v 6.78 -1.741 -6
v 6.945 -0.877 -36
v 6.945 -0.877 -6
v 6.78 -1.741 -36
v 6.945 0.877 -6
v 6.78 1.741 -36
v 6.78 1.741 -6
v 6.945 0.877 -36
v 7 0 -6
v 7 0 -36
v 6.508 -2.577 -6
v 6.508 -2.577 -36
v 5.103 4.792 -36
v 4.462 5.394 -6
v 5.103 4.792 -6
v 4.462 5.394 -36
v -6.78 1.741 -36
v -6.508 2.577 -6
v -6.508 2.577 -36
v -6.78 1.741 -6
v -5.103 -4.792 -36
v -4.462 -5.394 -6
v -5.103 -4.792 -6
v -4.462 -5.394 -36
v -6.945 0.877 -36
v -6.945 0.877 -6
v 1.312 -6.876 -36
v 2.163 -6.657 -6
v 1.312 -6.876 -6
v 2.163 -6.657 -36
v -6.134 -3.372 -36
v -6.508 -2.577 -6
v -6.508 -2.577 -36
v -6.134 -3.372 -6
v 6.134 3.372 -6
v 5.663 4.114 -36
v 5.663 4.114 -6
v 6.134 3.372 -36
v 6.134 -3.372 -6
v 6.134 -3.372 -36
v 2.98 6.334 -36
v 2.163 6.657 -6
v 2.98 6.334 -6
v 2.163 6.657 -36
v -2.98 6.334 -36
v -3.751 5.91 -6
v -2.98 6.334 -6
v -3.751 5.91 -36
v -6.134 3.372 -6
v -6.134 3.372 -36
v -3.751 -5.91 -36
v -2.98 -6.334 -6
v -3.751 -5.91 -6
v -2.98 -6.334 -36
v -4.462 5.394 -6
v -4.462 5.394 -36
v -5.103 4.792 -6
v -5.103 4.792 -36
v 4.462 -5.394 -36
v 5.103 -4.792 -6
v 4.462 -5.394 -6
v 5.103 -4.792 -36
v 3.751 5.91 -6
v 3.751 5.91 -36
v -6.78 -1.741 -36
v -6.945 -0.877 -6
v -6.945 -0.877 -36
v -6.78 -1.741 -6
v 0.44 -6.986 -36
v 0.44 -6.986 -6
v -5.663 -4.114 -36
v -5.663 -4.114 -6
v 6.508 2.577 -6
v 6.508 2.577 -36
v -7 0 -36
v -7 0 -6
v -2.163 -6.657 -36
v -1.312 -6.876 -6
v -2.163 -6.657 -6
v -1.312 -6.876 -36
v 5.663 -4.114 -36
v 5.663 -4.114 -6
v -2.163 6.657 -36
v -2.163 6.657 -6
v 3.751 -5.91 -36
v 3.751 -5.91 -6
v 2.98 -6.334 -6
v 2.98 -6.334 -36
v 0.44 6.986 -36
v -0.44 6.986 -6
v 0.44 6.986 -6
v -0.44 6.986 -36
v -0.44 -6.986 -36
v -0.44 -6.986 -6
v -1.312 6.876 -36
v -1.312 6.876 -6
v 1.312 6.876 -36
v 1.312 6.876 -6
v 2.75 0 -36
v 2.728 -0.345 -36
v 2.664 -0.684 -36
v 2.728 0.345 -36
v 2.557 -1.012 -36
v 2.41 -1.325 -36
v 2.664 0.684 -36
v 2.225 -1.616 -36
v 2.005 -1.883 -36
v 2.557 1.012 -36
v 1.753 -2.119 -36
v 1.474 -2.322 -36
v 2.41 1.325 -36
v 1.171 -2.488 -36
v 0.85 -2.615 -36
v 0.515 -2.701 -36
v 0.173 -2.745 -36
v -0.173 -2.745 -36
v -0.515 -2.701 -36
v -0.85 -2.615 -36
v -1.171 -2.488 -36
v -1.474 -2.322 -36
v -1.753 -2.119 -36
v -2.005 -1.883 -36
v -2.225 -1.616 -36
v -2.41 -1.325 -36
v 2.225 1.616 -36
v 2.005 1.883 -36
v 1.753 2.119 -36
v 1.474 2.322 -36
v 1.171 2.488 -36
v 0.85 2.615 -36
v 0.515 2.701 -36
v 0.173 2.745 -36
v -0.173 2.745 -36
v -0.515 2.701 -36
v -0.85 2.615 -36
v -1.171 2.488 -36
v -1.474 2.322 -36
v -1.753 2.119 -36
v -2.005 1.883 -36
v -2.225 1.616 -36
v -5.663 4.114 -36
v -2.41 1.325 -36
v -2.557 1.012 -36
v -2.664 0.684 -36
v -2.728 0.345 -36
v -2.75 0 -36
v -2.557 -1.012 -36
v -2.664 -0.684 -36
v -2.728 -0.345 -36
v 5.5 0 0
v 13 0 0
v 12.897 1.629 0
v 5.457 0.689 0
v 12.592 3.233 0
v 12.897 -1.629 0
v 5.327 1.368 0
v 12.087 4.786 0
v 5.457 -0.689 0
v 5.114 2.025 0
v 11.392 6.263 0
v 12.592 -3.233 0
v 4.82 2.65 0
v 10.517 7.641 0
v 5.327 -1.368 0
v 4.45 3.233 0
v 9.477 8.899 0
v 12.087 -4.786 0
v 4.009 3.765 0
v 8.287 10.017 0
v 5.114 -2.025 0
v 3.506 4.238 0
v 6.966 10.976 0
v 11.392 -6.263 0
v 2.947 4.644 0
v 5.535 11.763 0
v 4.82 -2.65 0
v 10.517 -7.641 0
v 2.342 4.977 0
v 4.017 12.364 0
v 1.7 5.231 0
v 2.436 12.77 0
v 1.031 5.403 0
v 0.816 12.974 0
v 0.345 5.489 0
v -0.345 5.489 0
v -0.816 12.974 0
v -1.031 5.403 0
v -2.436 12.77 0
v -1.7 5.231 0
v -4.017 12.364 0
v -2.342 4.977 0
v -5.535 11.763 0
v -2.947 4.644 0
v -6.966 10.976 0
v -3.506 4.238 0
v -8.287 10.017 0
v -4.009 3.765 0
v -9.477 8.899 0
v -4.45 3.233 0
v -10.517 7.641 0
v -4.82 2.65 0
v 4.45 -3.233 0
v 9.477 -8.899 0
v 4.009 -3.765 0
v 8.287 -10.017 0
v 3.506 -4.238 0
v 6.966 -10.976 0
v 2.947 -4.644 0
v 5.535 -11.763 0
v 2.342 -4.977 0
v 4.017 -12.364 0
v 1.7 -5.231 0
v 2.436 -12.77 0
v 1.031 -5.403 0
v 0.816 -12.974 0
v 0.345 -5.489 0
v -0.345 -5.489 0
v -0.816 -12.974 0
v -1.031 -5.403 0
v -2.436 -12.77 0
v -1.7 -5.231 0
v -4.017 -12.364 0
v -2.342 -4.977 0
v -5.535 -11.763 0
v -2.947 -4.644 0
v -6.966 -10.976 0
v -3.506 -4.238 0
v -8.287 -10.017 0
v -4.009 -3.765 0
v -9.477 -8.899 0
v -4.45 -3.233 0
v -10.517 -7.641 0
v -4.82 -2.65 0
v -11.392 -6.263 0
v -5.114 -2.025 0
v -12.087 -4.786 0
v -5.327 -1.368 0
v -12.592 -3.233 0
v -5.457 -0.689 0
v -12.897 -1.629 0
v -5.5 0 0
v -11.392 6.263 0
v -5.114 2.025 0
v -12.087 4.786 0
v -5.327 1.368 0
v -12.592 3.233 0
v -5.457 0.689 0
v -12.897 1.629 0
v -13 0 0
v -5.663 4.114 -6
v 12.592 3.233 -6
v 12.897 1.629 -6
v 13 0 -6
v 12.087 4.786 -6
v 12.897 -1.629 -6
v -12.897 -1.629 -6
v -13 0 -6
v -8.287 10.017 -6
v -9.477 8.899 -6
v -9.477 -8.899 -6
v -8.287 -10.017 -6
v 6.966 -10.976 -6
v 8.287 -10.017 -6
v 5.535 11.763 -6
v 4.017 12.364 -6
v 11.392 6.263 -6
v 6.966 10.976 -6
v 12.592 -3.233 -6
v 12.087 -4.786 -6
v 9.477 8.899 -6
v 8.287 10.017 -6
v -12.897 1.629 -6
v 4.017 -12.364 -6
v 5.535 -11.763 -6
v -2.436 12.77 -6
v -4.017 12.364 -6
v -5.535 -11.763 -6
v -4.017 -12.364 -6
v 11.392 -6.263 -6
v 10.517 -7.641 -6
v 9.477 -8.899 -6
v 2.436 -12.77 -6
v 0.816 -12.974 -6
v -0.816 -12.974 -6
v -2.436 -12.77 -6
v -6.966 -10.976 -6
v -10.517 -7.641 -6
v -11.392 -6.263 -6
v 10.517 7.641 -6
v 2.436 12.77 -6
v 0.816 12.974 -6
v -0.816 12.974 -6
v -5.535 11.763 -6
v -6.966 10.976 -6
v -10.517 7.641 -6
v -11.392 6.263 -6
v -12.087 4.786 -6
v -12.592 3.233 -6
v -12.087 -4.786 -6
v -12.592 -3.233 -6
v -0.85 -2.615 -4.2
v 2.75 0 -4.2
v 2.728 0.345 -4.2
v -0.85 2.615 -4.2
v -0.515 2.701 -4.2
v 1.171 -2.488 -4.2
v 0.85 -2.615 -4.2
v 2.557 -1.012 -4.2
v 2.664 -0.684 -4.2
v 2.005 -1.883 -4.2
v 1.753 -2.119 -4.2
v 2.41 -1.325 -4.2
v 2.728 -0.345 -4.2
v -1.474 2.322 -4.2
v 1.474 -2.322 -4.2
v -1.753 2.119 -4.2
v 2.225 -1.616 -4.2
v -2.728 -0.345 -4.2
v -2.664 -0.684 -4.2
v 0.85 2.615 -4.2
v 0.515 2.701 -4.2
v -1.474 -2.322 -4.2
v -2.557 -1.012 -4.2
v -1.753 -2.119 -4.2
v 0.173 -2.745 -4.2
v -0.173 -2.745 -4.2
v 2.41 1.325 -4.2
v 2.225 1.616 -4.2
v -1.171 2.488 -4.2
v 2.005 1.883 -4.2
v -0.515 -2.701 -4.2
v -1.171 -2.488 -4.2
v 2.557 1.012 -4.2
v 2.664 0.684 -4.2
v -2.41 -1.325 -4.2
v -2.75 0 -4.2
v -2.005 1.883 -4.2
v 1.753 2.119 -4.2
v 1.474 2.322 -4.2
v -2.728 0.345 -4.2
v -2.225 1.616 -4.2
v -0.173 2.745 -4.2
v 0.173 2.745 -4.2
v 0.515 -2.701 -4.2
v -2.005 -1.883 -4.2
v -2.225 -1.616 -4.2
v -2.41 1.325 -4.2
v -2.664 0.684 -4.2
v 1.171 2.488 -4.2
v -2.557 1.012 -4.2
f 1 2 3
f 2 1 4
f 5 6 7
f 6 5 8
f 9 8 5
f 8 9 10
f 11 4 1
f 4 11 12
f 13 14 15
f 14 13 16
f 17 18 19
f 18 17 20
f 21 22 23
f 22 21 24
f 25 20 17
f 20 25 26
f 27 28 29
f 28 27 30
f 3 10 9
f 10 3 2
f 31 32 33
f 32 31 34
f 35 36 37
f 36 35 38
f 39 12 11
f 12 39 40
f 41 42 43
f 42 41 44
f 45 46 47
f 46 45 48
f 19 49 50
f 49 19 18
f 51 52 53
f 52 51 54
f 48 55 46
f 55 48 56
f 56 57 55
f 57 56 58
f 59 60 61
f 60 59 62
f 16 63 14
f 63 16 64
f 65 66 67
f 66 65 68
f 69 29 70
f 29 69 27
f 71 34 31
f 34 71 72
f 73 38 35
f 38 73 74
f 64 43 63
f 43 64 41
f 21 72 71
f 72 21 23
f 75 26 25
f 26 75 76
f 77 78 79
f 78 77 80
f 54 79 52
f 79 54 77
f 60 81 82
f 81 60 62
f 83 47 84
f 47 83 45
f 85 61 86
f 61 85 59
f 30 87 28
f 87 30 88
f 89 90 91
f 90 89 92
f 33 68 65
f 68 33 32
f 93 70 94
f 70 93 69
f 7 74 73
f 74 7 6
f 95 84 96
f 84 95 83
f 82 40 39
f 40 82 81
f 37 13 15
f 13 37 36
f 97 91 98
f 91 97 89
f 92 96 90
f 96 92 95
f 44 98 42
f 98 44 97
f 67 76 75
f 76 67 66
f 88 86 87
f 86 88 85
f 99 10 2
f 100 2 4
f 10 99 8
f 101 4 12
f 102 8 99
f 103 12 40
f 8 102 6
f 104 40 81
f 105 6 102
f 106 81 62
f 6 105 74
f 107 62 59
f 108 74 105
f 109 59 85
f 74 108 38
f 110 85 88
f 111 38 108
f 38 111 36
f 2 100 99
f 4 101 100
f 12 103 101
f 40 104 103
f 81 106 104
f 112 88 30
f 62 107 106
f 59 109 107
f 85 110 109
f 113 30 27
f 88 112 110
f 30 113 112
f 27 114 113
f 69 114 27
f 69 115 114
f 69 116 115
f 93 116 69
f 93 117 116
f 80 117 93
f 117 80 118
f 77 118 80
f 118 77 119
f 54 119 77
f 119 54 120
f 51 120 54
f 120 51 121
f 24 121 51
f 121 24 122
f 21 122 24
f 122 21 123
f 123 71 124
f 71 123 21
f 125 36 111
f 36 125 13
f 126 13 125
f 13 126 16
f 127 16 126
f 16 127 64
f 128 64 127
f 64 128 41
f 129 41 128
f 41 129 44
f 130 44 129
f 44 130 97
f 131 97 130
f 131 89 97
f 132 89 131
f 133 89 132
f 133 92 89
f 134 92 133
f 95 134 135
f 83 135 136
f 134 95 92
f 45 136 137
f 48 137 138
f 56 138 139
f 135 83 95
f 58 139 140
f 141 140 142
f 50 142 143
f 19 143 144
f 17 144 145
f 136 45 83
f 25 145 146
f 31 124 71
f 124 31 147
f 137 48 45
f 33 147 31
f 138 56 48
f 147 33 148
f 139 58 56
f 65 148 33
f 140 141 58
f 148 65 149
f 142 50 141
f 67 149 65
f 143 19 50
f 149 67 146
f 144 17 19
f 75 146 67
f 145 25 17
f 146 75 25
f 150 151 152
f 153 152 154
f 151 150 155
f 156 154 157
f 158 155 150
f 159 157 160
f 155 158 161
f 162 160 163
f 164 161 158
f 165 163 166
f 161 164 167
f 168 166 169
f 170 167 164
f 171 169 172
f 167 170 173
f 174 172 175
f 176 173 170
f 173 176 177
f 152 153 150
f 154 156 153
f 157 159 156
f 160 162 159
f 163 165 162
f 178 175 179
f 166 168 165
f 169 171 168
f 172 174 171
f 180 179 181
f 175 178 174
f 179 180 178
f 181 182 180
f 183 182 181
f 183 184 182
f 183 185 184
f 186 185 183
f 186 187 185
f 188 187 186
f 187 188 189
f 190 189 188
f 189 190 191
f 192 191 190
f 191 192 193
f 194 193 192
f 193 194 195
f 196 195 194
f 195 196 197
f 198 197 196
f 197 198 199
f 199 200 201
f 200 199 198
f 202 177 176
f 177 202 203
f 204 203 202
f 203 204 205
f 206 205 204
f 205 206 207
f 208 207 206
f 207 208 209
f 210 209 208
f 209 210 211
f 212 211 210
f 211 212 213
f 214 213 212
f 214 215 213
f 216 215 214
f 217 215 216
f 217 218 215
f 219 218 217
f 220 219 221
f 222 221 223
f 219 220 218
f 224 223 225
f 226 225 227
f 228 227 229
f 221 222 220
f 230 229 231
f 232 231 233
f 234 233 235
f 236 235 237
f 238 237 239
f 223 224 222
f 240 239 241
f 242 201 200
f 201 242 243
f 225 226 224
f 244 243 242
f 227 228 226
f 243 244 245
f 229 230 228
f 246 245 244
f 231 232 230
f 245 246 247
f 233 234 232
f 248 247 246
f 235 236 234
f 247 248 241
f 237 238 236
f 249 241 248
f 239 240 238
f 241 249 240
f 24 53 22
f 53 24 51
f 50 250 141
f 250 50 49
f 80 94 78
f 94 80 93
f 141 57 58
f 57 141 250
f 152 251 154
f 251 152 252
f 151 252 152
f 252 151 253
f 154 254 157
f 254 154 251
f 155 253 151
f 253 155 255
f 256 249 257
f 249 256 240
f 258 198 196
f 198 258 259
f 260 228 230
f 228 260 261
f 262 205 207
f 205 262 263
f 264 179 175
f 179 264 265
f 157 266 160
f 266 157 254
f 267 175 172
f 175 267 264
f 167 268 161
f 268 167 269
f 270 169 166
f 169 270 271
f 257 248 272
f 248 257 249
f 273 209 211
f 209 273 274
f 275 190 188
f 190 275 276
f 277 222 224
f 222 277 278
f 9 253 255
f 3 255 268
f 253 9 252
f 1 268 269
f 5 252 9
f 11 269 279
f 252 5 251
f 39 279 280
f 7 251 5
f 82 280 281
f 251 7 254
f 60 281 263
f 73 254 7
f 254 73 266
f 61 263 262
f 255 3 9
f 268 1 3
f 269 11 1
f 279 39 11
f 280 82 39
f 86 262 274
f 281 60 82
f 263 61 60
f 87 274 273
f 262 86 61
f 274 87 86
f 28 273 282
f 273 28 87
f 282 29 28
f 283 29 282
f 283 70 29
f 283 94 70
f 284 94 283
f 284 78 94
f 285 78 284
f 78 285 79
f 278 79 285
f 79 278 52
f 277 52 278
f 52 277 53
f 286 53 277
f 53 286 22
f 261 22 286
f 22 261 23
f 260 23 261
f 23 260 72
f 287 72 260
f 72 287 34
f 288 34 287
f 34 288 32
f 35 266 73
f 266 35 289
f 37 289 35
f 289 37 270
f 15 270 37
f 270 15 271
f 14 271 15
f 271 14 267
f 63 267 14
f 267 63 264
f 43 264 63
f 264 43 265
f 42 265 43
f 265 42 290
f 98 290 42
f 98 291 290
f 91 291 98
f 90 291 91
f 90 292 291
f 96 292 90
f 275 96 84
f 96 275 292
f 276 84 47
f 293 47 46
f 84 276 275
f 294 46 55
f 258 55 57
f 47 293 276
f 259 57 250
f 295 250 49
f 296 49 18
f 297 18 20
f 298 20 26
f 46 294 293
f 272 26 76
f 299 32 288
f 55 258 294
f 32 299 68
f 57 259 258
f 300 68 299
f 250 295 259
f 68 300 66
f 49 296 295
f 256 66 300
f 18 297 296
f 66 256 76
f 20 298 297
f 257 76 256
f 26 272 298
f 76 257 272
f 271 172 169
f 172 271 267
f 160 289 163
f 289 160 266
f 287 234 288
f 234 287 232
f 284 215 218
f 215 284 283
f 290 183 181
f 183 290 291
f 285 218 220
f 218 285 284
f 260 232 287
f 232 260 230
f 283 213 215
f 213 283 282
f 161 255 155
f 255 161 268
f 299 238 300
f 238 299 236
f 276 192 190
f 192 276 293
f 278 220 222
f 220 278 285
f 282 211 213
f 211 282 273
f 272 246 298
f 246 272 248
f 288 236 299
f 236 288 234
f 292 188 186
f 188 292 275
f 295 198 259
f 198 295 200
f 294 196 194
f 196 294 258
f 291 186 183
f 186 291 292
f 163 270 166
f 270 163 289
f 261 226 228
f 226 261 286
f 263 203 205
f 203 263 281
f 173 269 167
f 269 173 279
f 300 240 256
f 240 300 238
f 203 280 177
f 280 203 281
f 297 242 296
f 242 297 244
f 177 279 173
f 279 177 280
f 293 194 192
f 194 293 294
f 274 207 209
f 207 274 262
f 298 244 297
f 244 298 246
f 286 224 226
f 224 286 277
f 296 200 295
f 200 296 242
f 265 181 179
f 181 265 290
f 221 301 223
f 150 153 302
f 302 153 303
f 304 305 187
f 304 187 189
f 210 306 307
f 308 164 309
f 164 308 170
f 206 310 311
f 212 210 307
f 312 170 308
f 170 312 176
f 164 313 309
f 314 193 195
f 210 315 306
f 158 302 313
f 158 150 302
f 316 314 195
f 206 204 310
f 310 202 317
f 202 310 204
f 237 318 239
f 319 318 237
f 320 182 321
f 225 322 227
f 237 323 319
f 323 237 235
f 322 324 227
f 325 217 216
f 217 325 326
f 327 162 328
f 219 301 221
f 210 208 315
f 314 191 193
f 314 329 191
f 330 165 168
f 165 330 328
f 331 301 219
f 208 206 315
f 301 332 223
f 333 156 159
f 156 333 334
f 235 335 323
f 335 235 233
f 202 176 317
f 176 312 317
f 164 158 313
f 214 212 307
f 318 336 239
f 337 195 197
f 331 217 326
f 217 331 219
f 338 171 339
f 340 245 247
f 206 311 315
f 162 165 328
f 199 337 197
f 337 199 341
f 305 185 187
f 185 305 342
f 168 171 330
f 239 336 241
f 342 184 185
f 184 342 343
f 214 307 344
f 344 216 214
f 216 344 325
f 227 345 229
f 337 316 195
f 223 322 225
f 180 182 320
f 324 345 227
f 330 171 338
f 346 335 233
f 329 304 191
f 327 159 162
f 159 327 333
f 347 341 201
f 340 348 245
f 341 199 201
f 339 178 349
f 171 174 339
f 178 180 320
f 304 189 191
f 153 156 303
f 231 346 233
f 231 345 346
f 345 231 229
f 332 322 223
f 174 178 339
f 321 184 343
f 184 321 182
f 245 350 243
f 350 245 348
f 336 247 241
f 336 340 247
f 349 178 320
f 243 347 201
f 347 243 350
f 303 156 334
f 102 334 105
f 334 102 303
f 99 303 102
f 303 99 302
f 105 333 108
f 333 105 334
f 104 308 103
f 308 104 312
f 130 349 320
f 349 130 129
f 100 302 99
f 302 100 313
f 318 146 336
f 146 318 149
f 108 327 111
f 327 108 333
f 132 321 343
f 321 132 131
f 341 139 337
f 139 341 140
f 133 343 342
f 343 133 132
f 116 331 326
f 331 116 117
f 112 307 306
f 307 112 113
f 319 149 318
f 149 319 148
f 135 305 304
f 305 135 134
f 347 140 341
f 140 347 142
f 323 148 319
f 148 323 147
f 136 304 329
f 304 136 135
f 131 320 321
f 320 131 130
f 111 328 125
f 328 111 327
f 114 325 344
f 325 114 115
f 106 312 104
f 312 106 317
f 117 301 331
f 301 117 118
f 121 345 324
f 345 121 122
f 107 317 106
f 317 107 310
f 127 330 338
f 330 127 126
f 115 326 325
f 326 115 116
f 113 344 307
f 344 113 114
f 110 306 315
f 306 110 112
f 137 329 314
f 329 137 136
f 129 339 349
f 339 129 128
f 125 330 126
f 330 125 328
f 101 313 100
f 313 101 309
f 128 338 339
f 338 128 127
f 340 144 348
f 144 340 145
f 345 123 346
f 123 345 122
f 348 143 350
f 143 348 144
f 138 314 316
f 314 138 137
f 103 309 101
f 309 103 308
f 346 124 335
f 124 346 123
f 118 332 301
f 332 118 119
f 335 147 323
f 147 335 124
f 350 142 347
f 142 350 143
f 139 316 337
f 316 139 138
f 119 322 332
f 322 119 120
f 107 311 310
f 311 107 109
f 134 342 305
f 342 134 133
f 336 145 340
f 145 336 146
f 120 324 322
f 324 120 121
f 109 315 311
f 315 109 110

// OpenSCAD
$fn = 50;


difference() {
	union() {
		translate(v = [0, 0, -36.0000000000]) {
			cylinder(h = 36, r = 7.0000000000);
		}
		translate(v = [0, 0, -6.0000000000]) {
			cylinder(h = 6, r = 13.0000000000);
		}
	}
	union() {
		translate(v = [0, 0, 0]) {
			rotate(a = [0, 0, 0]) {
				difference() {
					union() {
						#translate(v = [0, 0, -36.0000000000]) {
							cylinder(h = 36, r = 2.2500000000);
						}
						#translate(v = [0, 0, -4.2000000000]) {
							cylinder(h = 4.2000000000, r = 7.0000000000, r1 = 2.7500000000, r2 = 5.5000000000);
						}
						#translate(v = [0, 0, -36.0000000000]) {
							cylinder(h = 36, r = 2.7500000000);
						}
						#translate(v = [0, 0, -36.0000000000]) {
							cylinder(h = 36, r = 2.2500000000);
						}
					}
					union();
				}
			}
		}
	}
}
